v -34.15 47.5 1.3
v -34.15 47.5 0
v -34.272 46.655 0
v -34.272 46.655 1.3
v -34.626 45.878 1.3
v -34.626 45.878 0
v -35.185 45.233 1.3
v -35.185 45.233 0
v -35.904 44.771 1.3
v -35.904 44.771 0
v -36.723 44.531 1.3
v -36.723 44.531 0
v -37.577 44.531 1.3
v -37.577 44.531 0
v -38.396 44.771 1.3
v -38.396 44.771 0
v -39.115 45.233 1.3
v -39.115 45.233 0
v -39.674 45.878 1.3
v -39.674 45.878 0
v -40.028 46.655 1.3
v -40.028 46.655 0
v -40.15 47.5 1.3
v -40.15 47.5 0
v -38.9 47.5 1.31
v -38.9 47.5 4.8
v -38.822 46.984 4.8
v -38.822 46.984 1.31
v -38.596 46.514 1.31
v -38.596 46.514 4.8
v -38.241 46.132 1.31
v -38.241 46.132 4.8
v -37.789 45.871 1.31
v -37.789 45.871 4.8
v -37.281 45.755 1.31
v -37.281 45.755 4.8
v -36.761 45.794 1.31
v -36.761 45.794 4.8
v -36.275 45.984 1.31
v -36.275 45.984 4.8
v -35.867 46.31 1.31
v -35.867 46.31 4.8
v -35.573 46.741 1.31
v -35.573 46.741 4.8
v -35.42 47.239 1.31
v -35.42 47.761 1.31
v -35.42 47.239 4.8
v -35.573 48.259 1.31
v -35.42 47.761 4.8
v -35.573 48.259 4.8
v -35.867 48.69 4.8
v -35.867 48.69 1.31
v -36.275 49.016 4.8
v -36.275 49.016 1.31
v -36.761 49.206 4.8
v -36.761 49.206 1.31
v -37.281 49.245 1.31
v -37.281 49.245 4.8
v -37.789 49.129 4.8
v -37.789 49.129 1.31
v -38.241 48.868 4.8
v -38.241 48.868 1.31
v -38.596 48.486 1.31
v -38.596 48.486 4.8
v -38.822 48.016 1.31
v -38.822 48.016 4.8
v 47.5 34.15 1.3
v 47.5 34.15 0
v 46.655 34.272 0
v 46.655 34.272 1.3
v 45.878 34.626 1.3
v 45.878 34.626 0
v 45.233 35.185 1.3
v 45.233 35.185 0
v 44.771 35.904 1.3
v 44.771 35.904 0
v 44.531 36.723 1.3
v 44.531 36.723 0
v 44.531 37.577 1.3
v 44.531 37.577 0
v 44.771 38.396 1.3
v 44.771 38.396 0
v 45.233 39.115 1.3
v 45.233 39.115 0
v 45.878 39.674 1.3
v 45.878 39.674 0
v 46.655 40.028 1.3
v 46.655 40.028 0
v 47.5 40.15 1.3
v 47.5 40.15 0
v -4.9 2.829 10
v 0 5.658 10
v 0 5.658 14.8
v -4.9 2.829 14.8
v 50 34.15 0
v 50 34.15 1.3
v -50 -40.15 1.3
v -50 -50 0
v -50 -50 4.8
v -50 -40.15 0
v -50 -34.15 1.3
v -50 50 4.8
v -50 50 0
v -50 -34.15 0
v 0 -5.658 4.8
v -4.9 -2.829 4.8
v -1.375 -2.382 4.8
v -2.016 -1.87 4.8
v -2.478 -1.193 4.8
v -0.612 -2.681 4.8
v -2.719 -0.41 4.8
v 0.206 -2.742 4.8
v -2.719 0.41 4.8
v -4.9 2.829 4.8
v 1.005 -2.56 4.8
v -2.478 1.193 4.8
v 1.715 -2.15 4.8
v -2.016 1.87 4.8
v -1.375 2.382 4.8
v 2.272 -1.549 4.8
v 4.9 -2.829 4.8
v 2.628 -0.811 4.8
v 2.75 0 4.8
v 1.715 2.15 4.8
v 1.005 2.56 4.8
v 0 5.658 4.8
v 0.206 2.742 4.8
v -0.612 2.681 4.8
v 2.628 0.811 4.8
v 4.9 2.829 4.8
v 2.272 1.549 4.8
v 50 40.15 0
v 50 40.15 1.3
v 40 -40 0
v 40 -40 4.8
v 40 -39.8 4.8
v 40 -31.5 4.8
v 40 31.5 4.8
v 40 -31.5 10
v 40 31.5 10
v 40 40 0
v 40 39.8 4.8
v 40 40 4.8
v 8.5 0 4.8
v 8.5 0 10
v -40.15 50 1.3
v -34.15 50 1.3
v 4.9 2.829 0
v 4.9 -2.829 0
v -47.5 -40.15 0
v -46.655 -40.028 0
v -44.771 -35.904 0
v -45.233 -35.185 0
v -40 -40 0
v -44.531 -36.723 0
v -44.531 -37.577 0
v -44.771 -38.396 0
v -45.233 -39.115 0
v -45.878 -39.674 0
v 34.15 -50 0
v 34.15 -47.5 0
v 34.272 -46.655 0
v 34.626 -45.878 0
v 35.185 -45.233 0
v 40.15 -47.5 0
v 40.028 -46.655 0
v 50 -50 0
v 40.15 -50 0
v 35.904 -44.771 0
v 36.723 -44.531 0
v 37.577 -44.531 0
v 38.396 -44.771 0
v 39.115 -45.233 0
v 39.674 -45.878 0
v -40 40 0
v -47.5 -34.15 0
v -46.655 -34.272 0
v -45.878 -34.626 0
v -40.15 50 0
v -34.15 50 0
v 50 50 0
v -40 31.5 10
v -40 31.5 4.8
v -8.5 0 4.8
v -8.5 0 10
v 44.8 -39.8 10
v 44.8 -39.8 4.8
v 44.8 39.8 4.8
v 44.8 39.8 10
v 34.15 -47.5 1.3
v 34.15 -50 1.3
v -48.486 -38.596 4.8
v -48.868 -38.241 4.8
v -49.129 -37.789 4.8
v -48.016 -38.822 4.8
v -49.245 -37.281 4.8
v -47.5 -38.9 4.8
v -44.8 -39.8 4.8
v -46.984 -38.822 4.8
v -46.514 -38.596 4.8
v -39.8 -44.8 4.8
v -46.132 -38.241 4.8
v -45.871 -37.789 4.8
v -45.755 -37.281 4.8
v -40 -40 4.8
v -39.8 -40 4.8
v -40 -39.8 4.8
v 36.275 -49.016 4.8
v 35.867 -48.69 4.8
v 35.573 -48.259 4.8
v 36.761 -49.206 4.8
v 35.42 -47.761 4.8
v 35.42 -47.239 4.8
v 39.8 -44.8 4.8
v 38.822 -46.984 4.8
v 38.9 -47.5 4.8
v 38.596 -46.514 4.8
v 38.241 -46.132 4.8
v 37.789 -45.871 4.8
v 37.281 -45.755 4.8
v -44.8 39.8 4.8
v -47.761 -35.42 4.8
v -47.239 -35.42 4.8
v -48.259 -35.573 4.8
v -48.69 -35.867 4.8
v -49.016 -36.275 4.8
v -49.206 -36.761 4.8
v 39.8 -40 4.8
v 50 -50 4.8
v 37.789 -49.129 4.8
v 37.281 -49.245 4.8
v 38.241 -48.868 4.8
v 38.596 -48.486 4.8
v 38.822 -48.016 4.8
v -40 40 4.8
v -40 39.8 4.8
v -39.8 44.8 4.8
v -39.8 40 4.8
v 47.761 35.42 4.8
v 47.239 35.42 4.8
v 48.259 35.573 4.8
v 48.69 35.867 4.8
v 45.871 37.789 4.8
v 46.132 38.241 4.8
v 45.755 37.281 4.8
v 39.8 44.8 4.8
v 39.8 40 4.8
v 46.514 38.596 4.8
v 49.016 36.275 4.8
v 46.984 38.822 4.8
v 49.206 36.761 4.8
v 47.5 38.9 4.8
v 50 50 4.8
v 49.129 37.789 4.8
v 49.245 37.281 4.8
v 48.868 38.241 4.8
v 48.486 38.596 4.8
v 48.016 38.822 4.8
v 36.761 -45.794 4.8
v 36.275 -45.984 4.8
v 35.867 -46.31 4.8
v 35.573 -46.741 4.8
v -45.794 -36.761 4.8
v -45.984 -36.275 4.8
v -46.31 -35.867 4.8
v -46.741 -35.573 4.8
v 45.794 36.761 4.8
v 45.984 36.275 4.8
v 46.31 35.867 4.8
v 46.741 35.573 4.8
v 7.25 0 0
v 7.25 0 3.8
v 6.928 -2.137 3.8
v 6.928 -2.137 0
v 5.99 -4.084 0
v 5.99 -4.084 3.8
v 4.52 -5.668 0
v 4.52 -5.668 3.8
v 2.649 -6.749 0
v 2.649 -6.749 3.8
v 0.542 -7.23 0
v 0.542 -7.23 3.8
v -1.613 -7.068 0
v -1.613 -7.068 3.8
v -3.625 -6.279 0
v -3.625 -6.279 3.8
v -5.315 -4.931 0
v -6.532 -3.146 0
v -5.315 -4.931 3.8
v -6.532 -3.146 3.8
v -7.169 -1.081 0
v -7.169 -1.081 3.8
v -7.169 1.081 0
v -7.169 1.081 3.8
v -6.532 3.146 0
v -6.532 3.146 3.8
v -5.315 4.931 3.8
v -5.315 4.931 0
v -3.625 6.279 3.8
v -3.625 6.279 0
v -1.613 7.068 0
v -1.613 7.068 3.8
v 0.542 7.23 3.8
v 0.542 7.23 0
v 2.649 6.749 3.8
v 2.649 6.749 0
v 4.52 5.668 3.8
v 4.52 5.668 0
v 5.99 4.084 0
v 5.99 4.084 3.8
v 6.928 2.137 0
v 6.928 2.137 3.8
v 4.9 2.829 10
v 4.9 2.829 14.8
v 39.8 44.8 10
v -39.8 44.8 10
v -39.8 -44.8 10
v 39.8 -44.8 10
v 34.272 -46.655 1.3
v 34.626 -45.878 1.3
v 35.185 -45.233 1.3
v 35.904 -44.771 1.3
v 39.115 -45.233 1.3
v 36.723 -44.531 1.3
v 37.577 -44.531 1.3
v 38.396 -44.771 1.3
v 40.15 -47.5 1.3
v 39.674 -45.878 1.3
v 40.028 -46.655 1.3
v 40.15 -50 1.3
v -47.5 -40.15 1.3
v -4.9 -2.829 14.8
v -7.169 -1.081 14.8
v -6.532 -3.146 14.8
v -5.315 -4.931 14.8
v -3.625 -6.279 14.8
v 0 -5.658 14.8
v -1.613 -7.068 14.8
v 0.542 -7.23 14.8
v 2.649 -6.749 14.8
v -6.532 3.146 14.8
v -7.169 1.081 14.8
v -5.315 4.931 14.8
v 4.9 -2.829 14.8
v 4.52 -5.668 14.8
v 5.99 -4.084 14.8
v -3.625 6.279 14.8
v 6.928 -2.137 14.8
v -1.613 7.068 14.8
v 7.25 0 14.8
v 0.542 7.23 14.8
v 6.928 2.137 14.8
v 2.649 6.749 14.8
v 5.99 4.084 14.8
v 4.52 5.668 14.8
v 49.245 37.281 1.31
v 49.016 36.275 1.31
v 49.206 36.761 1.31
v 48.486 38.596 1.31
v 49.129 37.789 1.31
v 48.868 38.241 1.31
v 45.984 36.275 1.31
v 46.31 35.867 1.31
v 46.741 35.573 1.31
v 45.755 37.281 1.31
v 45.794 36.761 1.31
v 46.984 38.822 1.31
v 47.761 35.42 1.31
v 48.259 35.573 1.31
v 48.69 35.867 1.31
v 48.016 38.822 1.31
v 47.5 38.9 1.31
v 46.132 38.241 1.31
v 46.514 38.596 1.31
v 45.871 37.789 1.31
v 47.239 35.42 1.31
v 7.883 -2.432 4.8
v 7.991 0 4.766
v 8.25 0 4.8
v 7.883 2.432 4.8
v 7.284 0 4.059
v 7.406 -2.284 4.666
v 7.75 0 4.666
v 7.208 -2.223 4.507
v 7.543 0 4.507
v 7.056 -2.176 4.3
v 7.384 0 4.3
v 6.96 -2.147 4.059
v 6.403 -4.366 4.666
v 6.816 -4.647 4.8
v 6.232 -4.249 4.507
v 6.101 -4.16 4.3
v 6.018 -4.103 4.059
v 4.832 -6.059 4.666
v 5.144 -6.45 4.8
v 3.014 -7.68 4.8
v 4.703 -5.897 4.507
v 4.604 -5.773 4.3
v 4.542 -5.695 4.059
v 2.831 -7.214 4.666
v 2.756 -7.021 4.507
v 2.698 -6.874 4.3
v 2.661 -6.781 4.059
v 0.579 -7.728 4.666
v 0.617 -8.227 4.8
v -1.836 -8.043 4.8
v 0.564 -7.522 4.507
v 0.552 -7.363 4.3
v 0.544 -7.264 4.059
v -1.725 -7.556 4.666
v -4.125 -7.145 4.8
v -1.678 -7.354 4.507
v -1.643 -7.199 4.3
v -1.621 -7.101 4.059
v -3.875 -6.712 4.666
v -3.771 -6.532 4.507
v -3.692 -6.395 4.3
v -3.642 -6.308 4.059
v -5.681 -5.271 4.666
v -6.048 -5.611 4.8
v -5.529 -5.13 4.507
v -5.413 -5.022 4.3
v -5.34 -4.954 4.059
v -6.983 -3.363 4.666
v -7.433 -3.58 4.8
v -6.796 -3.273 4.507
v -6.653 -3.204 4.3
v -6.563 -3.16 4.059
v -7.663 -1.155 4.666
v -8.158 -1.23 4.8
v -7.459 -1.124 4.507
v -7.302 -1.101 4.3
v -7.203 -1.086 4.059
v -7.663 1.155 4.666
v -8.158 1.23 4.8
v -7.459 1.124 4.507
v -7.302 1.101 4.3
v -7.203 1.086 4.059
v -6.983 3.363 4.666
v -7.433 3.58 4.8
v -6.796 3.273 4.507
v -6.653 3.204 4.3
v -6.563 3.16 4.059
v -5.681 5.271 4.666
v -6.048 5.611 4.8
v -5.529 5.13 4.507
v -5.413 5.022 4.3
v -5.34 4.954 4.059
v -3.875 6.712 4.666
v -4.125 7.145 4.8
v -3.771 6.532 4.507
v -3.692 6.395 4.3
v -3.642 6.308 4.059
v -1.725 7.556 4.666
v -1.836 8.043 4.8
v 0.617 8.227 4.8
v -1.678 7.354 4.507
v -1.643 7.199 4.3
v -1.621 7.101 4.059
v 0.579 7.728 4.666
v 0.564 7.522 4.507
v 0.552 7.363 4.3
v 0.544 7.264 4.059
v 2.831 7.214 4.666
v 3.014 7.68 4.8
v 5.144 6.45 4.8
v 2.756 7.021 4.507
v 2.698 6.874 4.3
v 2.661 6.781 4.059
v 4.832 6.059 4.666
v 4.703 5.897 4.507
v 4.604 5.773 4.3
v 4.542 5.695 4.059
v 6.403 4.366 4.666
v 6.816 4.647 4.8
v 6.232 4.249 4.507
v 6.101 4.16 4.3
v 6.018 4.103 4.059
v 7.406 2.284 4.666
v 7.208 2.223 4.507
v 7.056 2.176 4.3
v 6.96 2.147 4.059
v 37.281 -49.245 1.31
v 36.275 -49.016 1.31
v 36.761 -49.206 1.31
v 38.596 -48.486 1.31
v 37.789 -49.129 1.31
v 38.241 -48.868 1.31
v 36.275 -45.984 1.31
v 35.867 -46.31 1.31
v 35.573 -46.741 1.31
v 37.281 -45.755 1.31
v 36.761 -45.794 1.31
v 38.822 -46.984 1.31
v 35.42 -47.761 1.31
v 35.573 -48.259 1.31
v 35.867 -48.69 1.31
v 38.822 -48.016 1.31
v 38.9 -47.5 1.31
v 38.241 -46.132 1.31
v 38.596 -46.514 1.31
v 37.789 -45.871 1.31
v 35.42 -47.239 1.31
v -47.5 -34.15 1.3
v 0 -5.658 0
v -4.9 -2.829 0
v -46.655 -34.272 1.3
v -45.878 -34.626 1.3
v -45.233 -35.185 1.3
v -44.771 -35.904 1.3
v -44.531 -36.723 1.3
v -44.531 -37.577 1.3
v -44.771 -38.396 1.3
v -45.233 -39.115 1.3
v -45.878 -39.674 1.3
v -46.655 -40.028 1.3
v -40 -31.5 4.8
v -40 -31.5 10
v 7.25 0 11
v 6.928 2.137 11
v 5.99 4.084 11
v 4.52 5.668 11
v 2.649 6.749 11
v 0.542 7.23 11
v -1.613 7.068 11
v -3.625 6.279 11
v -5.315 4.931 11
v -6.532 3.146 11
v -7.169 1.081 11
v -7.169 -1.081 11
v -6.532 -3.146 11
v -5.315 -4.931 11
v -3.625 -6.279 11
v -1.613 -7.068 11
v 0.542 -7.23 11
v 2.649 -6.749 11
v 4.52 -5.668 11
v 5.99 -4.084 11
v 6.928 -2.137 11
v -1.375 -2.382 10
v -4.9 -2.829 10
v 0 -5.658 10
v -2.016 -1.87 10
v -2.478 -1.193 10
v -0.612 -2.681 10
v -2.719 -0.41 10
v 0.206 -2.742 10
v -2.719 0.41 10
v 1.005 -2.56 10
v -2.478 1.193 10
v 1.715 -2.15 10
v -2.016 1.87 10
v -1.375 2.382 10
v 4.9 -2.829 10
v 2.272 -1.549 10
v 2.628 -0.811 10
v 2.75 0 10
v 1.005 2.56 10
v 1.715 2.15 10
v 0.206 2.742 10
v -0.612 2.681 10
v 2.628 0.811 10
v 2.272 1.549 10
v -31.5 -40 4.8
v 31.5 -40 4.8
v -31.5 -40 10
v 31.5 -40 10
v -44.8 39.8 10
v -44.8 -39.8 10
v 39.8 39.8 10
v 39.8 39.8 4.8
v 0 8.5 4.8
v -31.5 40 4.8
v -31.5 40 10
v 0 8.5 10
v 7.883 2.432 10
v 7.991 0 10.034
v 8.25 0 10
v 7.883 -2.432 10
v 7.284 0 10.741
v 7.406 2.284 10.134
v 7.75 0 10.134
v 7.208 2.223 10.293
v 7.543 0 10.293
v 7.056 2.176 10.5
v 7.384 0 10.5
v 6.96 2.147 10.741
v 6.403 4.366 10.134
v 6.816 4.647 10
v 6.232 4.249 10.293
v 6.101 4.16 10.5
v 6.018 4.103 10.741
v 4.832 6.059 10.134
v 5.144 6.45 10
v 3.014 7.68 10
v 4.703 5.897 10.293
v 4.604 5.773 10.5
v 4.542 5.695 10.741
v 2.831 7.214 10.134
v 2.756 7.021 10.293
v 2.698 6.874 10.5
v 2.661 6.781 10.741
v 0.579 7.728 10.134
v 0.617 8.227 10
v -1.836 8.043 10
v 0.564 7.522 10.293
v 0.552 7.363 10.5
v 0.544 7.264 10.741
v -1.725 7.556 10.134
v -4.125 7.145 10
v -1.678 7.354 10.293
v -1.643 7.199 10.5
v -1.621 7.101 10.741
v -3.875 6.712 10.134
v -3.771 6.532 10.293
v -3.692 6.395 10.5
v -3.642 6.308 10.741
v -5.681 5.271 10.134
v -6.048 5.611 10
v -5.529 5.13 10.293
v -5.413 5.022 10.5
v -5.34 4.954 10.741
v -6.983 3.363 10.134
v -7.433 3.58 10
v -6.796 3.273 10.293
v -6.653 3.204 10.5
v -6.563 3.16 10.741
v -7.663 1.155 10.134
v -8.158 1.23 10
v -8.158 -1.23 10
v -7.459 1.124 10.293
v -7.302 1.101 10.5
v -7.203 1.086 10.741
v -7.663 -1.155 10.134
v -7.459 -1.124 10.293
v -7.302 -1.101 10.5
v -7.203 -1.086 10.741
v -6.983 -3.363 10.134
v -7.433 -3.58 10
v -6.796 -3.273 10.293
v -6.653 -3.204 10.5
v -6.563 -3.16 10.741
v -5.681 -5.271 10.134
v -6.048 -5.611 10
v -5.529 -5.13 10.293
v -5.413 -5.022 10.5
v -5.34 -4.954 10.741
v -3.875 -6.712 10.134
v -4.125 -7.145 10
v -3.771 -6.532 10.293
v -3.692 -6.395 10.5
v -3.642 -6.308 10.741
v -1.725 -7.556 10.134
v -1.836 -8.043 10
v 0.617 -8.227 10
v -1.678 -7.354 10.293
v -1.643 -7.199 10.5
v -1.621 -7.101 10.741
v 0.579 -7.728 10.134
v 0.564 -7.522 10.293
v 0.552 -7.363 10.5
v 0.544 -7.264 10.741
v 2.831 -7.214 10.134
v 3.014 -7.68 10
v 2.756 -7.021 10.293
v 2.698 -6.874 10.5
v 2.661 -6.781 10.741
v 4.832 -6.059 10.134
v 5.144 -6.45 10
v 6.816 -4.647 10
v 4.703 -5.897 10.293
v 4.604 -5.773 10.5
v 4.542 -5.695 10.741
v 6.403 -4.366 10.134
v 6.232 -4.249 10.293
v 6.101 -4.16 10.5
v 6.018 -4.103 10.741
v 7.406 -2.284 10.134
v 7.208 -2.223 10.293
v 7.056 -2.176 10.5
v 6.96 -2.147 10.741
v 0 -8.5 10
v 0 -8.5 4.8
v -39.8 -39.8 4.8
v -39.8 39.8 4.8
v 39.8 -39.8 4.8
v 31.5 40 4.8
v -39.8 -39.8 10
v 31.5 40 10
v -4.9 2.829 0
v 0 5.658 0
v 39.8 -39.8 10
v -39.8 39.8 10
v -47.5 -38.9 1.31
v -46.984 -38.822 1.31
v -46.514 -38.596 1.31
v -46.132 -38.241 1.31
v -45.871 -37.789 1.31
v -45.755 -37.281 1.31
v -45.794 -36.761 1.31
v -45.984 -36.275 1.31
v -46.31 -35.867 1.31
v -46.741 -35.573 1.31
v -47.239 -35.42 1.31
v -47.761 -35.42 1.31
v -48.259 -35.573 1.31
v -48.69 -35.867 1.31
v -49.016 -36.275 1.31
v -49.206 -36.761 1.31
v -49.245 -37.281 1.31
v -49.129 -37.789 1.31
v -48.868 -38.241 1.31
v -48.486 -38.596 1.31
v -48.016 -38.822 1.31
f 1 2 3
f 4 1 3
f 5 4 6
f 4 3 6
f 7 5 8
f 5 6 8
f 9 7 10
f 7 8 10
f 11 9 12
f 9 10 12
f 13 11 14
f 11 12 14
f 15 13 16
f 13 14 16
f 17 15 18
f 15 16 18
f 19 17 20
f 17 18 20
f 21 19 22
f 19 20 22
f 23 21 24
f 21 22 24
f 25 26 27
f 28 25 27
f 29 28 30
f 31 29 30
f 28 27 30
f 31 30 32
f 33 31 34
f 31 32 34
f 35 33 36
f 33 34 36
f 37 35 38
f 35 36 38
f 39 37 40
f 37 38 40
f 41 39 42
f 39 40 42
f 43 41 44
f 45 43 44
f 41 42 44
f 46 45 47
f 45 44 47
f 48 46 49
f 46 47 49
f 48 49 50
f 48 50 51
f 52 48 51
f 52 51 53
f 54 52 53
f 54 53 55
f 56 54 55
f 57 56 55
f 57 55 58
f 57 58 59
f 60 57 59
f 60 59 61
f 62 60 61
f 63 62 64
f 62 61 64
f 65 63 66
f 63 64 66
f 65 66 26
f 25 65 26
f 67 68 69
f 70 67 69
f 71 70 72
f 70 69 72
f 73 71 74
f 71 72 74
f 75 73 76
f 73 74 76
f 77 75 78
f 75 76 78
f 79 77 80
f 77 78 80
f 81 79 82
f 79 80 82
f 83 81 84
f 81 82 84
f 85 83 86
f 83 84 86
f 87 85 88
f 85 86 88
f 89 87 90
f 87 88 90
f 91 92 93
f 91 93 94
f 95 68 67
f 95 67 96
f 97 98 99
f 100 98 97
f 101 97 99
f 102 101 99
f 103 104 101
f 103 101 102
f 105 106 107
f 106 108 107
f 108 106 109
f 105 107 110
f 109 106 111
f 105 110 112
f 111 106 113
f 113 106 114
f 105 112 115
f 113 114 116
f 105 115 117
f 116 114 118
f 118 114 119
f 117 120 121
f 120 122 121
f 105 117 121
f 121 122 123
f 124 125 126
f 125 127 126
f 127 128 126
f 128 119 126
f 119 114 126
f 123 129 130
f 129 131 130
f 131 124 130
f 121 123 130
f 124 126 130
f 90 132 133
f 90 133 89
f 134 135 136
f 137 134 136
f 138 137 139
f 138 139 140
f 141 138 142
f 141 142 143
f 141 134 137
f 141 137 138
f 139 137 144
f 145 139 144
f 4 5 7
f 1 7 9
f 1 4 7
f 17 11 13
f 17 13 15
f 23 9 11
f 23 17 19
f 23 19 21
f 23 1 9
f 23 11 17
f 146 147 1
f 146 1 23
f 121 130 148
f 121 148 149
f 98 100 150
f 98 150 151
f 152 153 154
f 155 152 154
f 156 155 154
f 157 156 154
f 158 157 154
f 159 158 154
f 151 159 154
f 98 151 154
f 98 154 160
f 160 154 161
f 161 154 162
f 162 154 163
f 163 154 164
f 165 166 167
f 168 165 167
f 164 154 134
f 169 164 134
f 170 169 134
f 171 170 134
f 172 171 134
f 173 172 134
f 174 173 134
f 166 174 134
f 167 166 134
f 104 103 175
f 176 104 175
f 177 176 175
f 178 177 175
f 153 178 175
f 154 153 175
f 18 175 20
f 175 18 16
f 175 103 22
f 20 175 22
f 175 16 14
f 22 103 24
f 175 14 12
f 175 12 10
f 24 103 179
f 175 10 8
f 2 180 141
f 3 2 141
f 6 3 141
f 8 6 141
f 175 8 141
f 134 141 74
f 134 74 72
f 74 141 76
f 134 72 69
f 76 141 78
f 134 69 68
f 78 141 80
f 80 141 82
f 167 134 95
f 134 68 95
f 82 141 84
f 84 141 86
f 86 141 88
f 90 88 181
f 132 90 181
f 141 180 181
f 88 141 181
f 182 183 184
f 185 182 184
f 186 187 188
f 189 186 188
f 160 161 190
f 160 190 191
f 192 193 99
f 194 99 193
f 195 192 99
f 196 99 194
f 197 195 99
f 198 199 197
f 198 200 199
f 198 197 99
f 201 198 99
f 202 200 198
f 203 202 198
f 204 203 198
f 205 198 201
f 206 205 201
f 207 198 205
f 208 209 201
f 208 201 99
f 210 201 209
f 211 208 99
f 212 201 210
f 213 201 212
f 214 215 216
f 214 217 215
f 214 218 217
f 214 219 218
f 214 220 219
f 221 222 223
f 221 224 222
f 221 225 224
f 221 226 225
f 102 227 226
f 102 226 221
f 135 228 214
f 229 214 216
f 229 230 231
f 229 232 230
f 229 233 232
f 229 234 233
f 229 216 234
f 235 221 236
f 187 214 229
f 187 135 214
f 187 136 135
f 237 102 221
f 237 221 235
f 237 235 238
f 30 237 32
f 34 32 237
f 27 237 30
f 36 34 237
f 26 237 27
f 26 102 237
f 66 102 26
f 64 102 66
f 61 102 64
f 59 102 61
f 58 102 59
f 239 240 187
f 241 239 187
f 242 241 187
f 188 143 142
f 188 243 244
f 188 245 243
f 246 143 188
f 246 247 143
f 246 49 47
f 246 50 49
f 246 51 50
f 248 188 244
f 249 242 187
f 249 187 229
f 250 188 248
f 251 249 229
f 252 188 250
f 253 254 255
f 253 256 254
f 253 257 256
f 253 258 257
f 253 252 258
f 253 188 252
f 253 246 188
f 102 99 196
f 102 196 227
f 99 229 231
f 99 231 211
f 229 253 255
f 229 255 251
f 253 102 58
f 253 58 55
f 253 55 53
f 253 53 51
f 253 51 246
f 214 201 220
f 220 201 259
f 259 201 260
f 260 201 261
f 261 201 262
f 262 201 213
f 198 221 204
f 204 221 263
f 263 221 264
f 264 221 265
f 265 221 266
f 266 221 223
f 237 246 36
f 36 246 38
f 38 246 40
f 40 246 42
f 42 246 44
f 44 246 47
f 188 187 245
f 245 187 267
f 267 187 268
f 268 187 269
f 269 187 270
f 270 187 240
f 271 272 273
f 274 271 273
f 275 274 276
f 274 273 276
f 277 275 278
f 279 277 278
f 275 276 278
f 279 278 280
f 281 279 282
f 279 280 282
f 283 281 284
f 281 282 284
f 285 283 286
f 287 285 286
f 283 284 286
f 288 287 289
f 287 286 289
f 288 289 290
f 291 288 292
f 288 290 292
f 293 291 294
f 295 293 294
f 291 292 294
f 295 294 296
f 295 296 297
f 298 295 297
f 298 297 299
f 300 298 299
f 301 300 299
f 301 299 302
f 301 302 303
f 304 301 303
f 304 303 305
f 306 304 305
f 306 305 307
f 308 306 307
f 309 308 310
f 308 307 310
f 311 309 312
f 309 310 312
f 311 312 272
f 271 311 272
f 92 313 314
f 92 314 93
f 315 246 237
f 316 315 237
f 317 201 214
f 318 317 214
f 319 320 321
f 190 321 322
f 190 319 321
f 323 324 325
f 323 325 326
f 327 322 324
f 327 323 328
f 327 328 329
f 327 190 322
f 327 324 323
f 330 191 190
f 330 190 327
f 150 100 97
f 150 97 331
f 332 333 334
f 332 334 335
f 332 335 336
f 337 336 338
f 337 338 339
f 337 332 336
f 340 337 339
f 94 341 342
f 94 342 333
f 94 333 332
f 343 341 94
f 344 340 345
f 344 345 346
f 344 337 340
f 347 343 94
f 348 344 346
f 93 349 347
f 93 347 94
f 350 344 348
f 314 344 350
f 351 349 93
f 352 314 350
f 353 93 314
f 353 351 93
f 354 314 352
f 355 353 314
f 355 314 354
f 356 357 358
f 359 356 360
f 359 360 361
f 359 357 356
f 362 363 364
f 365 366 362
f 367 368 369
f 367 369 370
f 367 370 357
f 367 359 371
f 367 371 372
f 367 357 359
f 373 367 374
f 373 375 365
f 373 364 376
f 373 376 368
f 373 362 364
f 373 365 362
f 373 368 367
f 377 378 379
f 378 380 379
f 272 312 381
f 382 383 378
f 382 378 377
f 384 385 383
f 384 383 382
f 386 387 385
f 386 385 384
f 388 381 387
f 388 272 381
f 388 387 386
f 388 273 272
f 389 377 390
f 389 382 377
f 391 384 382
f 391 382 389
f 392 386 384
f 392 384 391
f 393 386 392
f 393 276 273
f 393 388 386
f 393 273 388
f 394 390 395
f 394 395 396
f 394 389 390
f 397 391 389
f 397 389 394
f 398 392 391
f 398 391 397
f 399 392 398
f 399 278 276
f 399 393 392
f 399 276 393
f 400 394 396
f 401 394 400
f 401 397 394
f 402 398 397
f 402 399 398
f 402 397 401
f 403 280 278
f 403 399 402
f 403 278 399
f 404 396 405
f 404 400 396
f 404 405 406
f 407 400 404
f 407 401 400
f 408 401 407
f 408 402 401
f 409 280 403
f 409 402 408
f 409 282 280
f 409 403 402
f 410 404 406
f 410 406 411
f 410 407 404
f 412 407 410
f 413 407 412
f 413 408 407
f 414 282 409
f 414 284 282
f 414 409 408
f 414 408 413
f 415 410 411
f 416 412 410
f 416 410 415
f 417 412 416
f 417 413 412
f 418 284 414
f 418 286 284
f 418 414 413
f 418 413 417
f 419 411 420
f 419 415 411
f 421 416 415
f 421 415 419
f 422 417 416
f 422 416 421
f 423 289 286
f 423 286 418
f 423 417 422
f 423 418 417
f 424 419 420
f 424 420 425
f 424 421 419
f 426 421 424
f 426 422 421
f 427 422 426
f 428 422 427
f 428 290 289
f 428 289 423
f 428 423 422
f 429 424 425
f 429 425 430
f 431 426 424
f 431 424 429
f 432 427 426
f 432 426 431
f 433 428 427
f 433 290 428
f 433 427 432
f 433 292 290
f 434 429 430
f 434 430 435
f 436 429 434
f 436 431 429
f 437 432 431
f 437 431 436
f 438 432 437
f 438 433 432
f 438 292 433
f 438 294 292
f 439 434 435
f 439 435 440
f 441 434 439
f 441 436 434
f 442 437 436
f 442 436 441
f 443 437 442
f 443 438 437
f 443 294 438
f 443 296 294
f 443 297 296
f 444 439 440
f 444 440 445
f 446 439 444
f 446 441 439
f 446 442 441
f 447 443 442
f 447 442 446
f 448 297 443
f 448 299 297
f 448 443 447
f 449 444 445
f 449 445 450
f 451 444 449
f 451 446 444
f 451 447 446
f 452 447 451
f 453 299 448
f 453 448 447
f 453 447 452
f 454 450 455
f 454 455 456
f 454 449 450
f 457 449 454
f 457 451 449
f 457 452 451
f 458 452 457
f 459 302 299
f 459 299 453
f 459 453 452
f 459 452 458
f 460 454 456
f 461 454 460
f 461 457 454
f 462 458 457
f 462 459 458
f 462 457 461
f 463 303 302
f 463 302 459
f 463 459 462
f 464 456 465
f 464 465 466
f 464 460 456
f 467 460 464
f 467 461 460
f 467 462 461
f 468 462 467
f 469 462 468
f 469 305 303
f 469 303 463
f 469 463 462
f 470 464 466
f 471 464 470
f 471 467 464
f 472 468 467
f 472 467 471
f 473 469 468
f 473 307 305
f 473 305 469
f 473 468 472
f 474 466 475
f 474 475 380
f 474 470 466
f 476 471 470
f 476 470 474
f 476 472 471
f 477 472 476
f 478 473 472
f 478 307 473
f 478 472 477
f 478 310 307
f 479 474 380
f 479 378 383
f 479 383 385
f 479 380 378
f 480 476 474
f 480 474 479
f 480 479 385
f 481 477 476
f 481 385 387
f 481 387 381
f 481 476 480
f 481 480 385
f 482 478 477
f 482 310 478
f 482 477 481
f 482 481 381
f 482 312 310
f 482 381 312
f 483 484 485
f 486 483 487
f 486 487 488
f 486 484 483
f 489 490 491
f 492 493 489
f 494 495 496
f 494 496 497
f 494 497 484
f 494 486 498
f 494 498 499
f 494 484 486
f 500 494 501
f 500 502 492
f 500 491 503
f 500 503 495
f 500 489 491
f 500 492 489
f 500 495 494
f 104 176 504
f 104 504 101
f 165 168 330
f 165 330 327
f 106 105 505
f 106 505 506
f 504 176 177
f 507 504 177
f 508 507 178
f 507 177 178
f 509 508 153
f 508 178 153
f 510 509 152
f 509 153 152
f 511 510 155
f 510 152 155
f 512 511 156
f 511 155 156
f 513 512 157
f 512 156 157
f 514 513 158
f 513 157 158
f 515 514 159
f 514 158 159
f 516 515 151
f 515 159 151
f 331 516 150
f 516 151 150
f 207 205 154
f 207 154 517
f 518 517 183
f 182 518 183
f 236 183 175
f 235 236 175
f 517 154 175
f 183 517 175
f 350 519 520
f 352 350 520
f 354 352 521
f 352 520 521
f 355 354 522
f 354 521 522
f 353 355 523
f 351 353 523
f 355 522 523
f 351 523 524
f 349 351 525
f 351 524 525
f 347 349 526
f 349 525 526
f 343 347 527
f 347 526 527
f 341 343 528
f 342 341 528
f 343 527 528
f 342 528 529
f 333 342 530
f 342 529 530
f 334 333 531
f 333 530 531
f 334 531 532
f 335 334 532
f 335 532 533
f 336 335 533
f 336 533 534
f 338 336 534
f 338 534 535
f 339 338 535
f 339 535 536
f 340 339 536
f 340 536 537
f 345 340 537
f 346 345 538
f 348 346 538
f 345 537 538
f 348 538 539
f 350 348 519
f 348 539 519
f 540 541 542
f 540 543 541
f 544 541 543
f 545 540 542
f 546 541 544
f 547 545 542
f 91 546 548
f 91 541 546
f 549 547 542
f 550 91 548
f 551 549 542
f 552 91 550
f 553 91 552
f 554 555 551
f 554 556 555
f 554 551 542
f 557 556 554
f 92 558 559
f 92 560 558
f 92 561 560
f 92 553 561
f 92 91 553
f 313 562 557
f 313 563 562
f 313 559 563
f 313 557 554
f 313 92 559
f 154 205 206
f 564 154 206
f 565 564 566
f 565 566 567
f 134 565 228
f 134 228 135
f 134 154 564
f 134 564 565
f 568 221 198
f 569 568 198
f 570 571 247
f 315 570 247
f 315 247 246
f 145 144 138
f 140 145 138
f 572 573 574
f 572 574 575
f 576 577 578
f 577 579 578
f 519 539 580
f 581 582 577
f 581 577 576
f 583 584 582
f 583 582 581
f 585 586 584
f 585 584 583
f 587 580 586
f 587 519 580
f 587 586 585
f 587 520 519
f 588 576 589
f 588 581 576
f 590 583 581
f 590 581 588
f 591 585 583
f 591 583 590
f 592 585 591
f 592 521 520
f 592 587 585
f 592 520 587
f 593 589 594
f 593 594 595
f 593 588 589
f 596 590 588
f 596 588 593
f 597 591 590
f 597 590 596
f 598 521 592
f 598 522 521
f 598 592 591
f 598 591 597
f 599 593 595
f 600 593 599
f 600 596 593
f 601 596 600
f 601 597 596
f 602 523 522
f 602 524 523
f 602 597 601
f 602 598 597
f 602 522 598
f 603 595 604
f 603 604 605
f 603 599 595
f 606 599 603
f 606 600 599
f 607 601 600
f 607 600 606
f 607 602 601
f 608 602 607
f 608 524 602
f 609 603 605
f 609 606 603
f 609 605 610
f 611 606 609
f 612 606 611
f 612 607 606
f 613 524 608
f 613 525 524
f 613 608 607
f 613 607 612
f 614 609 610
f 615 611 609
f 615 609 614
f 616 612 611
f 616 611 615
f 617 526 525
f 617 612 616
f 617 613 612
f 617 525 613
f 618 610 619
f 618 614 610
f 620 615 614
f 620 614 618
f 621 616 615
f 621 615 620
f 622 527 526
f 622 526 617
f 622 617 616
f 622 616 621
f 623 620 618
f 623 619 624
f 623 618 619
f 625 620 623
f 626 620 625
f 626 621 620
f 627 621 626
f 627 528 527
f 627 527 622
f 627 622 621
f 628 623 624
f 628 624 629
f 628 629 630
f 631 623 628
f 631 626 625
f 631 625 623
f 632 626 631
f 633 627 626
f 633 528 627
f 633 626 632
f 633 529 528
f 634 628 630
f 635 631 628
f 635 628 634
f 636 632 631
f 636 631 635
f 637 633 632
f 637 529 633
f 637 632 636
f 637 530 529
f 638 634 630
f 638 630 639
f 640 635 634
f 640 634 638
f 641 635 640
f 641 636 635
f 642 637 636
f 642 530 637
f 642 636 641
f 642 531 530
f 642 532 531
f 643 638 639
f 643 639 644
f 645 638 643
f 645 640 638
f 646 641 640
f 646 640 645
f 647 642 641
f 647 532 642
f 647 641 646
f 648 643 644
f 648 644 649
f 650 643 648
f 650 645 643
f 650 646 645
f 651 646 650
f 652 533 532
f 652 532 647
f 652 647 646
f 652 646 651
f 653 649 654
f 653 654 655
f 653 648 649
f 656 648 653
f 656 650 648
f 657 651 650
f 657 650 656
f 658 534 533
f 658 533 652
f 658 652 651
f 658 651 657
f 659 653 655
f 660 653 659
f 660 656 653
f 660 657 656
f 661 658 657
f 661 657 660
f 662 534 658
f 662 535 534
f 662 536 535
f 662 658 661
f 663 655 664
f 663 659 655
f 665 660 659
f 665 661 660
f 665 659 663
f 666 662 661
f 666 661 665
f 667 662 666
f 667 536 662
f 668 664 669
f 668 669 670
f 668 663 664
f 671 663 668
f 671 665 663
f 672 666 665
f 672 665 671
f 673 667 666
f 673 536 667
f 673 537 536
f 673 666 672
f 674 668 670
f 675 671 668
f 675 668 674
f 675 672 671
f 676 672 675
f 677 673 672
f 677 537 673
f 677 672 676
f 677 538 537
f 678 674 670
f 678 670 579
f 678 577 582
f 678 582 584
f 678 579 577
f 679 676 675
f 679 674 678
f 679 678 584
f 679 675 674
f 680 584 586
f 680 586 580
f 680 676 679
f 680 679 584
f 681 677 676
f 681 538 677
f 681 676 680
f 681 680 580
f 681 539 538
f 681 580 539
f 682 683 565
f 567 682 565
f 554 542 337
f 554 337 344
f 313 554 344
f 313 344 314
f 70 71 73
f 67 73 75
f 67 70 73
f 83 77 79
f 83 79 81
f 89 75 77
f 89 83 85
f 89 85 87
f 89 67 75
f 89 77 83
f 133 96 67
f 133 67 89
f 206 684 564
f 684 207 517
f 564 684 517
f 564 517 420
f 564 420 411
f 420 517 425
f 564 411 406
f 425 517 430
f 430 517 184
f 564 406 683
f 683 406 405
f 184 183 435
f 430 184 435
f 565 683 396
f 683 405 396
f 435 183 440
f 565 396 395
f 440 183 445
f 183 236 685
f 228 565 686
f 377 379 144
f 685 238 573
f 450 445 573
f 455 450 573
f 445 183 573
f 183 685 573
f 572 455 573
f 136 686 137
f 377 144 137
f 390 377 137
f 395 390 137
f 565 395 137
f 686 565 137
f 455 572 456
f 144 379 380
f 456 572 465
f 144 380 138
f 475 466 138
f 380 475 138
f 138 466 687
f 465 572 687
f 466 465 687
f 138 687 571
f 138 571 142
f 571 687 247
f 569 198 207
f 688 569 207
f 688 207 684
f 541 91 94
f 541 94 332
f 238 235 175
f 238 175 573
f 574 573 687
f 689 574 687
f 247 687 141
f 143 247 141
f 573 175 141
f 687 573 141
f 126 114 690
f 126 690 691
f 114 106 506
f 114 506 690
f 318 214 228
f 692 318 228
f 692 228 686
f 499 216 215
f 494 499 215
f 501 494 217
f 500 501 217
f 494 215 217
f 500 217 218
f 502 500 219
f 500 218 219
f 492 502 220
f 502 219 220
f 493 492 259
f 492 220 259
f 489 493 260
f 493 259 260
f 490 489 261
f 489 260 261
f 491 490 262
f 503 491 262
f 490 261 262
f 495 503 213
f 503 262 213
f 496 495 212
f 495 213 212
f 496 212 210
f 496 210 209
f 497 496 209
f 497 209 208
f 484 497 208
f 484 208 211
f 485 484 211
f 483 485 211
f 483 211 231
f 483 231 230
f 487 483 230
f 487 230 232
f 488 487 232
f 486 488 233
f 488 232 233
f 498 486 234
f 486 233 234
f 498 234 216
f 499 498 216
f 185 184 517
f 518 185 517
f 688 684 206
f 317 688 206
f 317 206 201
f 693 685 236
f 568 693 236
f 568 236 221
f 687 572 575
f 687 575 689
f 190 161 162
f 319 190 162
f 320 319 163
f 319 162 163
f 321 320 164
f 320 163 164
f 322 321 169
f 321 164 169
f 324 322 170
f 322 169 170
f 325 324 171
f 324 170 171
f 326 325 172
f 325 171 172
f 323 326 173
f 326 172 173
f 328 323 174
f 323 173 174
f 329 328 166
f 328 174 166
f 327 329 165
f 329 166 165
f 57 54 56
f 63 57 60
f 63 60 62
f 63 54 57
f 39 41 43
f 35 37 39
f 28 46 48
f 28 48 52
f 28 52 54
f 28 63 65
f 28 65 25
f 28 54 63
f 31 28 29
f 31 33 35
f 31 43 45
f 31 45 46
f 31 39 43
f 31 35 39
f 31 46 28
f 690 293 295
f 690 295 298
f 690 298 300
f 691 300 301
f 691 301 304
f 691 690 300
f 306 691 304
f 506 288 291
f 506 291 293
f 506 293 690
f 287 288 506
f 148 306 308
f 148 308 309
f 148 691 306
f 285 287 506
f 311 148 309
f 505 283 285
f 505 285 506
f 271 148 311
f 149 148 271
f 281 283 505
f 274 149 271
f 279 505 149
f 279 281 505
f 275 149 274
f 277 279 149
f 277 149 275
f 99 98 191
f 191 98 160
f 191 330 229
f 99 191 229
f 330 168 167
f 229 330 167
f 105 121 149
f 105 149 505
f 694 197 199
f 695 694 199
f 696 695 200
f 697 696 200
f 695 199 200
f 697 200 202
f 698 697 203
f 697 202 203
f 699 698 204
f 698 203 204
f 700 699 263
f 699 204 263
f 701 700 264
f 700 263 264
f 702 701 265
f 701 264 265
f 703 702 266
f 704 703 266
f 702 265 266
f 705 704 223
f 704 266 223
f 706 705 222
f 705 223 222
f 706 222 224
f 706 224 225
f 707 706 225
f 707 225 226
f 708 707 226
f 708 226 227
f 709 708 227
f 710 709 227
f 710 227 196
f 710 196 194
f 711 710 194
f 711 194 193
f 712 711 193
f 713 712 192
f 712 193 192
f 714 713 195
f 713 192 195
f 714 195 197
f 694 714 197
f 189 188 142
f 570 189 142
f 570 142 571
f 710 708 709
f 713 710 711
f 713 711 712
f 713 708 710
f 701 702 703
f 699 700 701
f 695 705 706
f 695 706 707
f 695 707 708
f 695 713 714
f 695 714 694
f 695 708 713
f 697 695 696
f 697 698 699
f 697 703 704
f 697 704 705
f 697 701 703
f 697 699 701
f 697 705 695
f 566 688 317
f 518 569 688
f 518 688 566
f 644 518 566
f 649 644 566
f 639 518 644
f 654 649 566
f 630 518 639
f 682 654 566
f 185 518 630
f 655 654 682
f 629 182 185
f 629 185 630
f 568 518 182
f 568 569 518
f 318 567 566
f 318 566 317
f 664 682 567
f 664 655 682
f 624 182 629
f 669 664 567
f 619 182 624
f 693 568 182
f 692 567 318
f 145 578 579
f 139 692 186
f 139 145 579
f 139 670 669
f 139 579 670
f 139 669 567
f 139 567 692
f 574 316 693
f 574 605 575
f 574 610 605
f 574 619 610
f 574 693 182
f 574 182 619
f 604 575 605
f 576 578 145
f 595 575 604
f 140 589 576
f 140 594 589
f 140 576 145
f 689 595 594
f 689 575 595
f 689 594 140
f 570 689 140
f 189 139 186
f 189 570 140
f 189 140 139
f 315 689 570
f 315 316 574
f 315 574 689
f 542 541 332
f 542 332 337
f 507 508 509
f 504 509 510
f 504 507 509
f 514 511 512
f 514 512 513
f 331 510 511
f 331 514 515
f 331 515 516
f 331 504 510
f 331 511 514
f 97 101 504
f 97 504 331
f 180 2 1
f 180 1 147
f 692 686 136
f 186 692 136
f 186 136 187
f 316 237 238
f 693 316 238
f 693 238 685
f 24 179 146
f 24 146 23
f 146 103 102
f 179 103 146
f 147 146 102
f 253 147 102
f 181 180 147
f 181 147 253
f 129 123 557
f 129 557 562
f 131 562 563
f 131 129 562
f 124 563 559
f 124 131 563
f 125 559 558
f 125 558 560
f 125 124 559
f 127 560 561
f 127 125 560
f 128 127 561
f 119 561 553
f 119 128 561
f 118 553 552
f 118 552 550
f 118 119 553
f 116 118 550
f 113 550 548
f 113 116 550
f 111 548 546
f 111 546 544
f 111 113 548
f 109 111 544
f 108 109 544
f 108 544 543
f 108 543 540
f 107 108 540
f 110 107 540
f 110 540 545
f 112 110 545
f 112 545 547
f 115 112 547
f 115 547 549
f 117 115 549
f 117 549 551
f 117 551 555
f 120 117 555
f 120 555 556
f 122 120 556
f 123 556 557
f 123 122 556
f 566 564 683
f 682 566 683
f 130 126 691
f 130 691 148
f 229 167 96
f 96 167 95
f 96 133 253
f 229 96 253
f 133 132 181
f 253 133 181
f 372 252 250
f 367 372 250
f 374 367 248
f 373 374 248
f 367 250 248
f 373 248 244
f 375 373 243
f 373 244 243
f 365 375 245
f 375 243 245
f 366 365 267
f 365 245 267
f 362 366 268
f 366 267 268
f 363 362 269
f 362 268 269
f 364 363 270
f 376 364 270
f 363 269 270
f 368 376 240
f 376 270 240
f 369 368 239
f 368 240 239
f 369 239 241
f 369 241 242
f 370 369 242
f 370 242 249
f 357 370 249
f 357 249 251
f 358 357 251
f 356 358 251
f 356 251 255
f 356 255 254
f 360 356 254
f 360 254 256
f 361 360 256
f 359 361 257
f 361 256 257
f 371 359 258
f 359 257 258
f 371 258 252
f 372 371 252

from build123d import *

# Parameters (mm, degrees)
SKETCH_W           = 100
SKETCH_H           = 100
SKETCH_W_2         = 80
SKETCH_H_2         = 80
PAD_DEPTH          = 4.8
SKETCH001_R        = 2.75
PAD001_DEPTH       = 5.2
SKETCH002_R        = 7.25
PAD002_DEPTH       = 4.8
SKETCH003_R        = 7.25
PAD003_DEPTH       = 4.8
POCKET001_DEPTH    = 1.3
SKETCH006_R        = 1.75
POCKET002_DEPTH    = 3.49
POLARPATTERN_COUNT = 4
FILLET_R           = 1


with BuildPart() as part:
    # Sketch → Pad (new body)
    with BuildSketch(Plane.XY):
        Rectangle(SKETCH_W, SKETCH_H)
        Rectangle(SKETCH_W_2, SKETCH_H_2, mode=Mode.SUBTRACT)
    extrude(amount=PAD_DEPTH)

    # Sketch001 (on Face10 of Pad) → Pad001 (join)
    with BuildSketch(Plane.XY.offset(4.8)):
        Polygon((-44.8, 39.8), (-44.8, -39.8), (-39.8, -39.8), (-39.8, -44.8), (39.8, -44.8), (39.8, -39.8), (44.8, -39.8), (44.8, 39.8), (39.8, 39.8), (39.8, 44.8), (-39.8, 44.8), (-39.8, 39.8), align=None)
        Circle(SKETCH001_R, mode=Mode.SUBTRACT)
        Polygon((-31.5, 40), (0, 8.5), (31.5, 40), align=None, mode=Mode.SUBTRACT)
        Polygon((-40, 31.5), (-8.5, 0), (-40, -31.5), align=None, mode=Mode.SUBTRACT)
        Polygon((8.5, 0), (40, 31.5), (40, -31.5), align=None, mode=Mode.SUBTRACT)
        Polygon((0, -8.5), (31.5, -40), (-31.5, -40), align=None, mode=Mode.SUBTRACT)
    extrude(amount=PAD001_DEPTH)

    # Sketch002 (on Face20 of Pad001) → Pad002 (join)
    with BuildSketch(Plane.XY.offset(10)):
        Circle(SKETCH002_R)
        Polygon((0, -5.658033), (4.9, -2.829016), (4.9, 2.829016), (0, 5.658033), (-4.9, 2.829016), (-4.9, -2.829016), align=None, mode=Mode.SUBTRACT)
    extrude(amount=PAD002_DEPTH)

    # Sketch003 (on Face23 of Pad002) → Pad003 (join)
    with BuildSketch(Plane(origin=(0, 0, 4.8), x_dir=(1, 0, 0), z_dir=(0, 0, -1))):
        Circle(SKETCH003_R)
        Polygon((0, -5.658033), (4.9, -2.829016), (4.9, 2.829016), (0, 5.658033), (-4.9, 2.829016), (-4.9, -2.829016), align=None, mode=Mode.SUBTRACT)
    extrude(amount=PAD003_DEPTH)

    # Sketch005 → Pocket001 (cut)
    with BuildSketch(Plane(origin=(0, 0, 0), x_dir=(1, 0, 0), z_dir=(0, 0, -1))):
        with BuildLine():
            ThreePointArc((34.15, 47.5), (37.15, 44.5), (40.15, 47.5))
            Line((40.15, 50), (40.15, 47.5))
            Line((34.15, 50), (40.15, 50))
            Line((34.15, 47.5), (34.15, 50))
        make_face()
    pocket001 = extrude(amount=-POCKET001_DEPTH, mode=Mode.SUBTRACT)

    # Sketch006 (on Face5 of Pocket001) → Pocket002 (cut)
    with BuildSketch(Plane.XY.offset(4.8)):
        with Locations((37.15, -47.5)):
            Circle(SKETCH006_R)
    pocket002 = extrude(amount=-POCKET002_DEPTH, mode=Mode.SUBTRACT)

    # PolarPattern: Pocket002, Pocket001 ×4 about axis
    polarpattern_axis = Axis((0, 0, 4.8), (0, 0, 1))
    for i in range(1, POLARPATTERN_COUNT):
        add(pocket002.rotate(polarpattern_axis, i * 360 / POLARPATTERN_COUNT), mode=Mode.SUBTRACT)
        add(pocket001.rotate(polarpattern_axis, i * 360 / POLARPATTERN_COUNT), mode=Mode.SUBTRACT)

    # Fillet
    fillet_edges = [part.edges().sort_by_distance(p)[0] for p in [
        (-7.25, 0, 10),
        (-7.25, 0, 4.8),
    ]]
    fillet(fillet_edges, radius=FILLET_R)


solid = part.part
